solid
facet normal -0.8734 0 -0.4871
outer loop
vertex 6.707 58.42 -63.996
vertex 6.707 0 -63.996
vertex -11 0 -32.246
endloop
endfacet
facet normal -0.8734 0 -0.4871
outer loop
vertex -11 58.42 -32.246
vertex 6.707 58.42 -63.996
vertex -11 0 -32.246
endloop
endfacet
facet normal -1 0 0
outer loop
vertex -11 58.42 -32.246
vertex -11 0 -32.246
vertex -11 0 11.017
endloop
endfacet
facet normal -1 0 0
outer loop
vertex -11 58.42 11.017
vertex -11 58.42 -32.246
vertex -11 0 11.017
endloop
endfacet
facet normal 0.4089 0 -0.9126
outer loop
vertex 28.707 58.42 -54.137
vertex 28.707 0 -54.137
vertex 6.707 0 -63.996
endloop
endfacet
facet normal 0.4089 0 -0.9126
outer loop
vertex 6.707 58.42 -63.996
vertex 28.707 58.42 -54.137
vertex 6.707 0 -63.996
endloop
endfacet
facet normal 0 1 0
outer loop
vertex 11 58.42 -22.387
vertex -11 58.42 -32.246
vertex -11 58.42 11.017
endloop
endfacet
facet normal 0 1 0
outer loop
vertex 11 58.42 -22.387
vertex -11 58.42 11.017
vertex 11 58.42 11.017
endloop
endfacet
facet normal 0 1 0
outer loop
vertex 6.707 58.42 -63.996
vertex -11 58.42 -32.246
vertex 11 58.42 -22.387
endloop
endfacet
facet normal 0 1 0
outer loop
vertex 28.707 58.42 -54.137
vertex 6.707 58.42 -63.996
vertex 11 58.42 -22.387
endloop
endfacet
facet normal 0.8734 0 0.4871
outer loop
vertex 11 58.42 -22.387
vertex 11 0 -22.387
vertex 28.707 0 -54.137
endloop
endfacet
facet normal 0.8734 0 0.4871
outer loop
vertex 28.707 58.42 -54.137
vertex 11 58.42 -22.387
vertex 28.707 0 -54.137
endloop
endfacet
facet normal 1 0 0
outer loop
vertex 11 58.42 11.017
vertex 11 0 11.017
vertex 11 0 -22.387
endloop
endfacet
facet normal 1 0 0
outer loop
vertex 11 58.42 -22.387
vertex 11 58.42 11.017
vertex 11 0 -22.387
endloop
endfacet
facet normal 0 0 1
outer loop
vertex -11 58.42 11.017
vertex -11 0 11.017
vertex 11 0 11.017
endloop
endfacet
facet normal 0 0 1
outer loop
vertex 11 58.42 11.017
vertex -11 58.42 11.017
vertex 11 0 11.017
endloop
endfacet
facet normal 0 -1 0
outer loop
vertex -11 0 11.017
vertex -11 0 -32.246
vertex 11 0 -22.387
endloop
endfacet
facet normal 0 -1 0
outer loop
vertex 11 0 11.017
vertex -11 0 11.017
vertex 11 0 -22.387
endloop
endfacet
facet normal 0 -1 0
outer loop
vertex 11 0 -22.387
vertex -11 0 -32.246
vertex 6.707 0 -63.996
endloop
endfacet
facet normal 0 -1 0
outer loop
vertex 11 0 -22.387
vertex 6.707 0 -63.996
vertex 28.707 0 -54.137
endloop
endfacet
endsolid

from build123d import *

# Parameters (mm, degrees)
BOSS_EXTRUDE1_DEPTH = 58.42


with BuildPart() as part:
    # Sketch1 → Boss-Extrude1 (new body)
    with BuildSketch(Plane(origin=(0, 0, 0), x_dir=(1, 0, 0), z_dir=(0, 1, 0))):
        Polygon((-11, 32.245966686), (0, 32.245966686), (11, 32.245966686), (11, 22.387267321), (28.706556195, 54.137267321), (6.706556195, 63.995966686), align=None)
        Polygon((11, 32.245966686), (0, 32.245966686), (0, 27.316617003), (11, 22.387267321), align=None)
        with BuildLine():
            Line((11, 22.387267321), (0, 27.316617003))
            Line((0, 27.316617003), (0, 24.413342341))
            ThreePointArc((0, 24.413342341), (3.049993619, 23.149993619), (4.313342341, 20.1))
            ThreePointArc((4.313342341, 20.1), (3.049993619, 17.050006381), (0, 15.786657659))
            Line((0, 15.786657659), (0, 4.27242655))
            ThreePointArc((0, 4.27242655), (3.021061785, 3.021061785), (4.27242655, 0))
            ThreePointArc((4.27242655, 0), (3.021061785, -3.021061785), (0, -4.27242655))
            Line((0, -4.27242655), (0, -11.017064321))
            Line((0, -11.017064321), (11, -11.017064321))
            Line((11, -11.017064321), (11, 22.387267321))
        make_face()
        Polygon((0, 27.316617003), (0, 32.245966686), (-11, 32.245966686), align=None)
        with BuildLine():
            Line((0, 24.413342341), (0, 27.316617003))
            Line((0, 27.316617003), (-11, 32.245966686))
            Line((-11, 32.245966686), (-11, -11.017064321))
            Line((-11, -11.017064321), (0, -11.017064321))
            Line((0, -11.017064321), (0, -4.27242655))
            ThreePointArc((0, -4.27242655), (-4.27242655, 0), (0, 4.27242655))
            Line((0, 4.27242655), (0, 15.786657659))
            ThreePointArc((0, 15.786657659), (-4.313342341, 20.1), (0, 24.413342341))
        make_face()
        with BuildLine():
            ThreePointArc((4.313342341, 20.1), (3.049993619, 23.149993619), (0, 24.413342341))
            Line((0, 24.413342341), (0, 15.786657659))
            ThreePointArc((0, 15.786657659), (3.049993619, 17.050006381), (4.313342341, 20.1))
        make_face()
        with BuildLine():
            Line((0, 15.786657659), (0, 24.413342341))
            ThreePointArc((0, 24.413342341), (-4.313342341, 20.1), (0, 15.786657659))
        make_face()
        with BuildLine():
            ThreePointArc((4.27242655, 0), (3.021061785, 3.021061785), (0, 4.27242655))
            Line((0, 4.27242655), (0, -4.27242655))
            ThreePointArc((0, -4.27242655), (3.021061785, -3.021061785), (4.27242655, 0))
        make_face()
        with BuildLine():
            Line((0, -4.27242655), (0, 4.27242655))
            ThreePointArc((0, 4.27242655), (-4.27242655, 0), (0, -4.27242655))
        make_face()
    extrude(amount=BOSS_EXTRUDE1_DEPTH)


solid = part.part
